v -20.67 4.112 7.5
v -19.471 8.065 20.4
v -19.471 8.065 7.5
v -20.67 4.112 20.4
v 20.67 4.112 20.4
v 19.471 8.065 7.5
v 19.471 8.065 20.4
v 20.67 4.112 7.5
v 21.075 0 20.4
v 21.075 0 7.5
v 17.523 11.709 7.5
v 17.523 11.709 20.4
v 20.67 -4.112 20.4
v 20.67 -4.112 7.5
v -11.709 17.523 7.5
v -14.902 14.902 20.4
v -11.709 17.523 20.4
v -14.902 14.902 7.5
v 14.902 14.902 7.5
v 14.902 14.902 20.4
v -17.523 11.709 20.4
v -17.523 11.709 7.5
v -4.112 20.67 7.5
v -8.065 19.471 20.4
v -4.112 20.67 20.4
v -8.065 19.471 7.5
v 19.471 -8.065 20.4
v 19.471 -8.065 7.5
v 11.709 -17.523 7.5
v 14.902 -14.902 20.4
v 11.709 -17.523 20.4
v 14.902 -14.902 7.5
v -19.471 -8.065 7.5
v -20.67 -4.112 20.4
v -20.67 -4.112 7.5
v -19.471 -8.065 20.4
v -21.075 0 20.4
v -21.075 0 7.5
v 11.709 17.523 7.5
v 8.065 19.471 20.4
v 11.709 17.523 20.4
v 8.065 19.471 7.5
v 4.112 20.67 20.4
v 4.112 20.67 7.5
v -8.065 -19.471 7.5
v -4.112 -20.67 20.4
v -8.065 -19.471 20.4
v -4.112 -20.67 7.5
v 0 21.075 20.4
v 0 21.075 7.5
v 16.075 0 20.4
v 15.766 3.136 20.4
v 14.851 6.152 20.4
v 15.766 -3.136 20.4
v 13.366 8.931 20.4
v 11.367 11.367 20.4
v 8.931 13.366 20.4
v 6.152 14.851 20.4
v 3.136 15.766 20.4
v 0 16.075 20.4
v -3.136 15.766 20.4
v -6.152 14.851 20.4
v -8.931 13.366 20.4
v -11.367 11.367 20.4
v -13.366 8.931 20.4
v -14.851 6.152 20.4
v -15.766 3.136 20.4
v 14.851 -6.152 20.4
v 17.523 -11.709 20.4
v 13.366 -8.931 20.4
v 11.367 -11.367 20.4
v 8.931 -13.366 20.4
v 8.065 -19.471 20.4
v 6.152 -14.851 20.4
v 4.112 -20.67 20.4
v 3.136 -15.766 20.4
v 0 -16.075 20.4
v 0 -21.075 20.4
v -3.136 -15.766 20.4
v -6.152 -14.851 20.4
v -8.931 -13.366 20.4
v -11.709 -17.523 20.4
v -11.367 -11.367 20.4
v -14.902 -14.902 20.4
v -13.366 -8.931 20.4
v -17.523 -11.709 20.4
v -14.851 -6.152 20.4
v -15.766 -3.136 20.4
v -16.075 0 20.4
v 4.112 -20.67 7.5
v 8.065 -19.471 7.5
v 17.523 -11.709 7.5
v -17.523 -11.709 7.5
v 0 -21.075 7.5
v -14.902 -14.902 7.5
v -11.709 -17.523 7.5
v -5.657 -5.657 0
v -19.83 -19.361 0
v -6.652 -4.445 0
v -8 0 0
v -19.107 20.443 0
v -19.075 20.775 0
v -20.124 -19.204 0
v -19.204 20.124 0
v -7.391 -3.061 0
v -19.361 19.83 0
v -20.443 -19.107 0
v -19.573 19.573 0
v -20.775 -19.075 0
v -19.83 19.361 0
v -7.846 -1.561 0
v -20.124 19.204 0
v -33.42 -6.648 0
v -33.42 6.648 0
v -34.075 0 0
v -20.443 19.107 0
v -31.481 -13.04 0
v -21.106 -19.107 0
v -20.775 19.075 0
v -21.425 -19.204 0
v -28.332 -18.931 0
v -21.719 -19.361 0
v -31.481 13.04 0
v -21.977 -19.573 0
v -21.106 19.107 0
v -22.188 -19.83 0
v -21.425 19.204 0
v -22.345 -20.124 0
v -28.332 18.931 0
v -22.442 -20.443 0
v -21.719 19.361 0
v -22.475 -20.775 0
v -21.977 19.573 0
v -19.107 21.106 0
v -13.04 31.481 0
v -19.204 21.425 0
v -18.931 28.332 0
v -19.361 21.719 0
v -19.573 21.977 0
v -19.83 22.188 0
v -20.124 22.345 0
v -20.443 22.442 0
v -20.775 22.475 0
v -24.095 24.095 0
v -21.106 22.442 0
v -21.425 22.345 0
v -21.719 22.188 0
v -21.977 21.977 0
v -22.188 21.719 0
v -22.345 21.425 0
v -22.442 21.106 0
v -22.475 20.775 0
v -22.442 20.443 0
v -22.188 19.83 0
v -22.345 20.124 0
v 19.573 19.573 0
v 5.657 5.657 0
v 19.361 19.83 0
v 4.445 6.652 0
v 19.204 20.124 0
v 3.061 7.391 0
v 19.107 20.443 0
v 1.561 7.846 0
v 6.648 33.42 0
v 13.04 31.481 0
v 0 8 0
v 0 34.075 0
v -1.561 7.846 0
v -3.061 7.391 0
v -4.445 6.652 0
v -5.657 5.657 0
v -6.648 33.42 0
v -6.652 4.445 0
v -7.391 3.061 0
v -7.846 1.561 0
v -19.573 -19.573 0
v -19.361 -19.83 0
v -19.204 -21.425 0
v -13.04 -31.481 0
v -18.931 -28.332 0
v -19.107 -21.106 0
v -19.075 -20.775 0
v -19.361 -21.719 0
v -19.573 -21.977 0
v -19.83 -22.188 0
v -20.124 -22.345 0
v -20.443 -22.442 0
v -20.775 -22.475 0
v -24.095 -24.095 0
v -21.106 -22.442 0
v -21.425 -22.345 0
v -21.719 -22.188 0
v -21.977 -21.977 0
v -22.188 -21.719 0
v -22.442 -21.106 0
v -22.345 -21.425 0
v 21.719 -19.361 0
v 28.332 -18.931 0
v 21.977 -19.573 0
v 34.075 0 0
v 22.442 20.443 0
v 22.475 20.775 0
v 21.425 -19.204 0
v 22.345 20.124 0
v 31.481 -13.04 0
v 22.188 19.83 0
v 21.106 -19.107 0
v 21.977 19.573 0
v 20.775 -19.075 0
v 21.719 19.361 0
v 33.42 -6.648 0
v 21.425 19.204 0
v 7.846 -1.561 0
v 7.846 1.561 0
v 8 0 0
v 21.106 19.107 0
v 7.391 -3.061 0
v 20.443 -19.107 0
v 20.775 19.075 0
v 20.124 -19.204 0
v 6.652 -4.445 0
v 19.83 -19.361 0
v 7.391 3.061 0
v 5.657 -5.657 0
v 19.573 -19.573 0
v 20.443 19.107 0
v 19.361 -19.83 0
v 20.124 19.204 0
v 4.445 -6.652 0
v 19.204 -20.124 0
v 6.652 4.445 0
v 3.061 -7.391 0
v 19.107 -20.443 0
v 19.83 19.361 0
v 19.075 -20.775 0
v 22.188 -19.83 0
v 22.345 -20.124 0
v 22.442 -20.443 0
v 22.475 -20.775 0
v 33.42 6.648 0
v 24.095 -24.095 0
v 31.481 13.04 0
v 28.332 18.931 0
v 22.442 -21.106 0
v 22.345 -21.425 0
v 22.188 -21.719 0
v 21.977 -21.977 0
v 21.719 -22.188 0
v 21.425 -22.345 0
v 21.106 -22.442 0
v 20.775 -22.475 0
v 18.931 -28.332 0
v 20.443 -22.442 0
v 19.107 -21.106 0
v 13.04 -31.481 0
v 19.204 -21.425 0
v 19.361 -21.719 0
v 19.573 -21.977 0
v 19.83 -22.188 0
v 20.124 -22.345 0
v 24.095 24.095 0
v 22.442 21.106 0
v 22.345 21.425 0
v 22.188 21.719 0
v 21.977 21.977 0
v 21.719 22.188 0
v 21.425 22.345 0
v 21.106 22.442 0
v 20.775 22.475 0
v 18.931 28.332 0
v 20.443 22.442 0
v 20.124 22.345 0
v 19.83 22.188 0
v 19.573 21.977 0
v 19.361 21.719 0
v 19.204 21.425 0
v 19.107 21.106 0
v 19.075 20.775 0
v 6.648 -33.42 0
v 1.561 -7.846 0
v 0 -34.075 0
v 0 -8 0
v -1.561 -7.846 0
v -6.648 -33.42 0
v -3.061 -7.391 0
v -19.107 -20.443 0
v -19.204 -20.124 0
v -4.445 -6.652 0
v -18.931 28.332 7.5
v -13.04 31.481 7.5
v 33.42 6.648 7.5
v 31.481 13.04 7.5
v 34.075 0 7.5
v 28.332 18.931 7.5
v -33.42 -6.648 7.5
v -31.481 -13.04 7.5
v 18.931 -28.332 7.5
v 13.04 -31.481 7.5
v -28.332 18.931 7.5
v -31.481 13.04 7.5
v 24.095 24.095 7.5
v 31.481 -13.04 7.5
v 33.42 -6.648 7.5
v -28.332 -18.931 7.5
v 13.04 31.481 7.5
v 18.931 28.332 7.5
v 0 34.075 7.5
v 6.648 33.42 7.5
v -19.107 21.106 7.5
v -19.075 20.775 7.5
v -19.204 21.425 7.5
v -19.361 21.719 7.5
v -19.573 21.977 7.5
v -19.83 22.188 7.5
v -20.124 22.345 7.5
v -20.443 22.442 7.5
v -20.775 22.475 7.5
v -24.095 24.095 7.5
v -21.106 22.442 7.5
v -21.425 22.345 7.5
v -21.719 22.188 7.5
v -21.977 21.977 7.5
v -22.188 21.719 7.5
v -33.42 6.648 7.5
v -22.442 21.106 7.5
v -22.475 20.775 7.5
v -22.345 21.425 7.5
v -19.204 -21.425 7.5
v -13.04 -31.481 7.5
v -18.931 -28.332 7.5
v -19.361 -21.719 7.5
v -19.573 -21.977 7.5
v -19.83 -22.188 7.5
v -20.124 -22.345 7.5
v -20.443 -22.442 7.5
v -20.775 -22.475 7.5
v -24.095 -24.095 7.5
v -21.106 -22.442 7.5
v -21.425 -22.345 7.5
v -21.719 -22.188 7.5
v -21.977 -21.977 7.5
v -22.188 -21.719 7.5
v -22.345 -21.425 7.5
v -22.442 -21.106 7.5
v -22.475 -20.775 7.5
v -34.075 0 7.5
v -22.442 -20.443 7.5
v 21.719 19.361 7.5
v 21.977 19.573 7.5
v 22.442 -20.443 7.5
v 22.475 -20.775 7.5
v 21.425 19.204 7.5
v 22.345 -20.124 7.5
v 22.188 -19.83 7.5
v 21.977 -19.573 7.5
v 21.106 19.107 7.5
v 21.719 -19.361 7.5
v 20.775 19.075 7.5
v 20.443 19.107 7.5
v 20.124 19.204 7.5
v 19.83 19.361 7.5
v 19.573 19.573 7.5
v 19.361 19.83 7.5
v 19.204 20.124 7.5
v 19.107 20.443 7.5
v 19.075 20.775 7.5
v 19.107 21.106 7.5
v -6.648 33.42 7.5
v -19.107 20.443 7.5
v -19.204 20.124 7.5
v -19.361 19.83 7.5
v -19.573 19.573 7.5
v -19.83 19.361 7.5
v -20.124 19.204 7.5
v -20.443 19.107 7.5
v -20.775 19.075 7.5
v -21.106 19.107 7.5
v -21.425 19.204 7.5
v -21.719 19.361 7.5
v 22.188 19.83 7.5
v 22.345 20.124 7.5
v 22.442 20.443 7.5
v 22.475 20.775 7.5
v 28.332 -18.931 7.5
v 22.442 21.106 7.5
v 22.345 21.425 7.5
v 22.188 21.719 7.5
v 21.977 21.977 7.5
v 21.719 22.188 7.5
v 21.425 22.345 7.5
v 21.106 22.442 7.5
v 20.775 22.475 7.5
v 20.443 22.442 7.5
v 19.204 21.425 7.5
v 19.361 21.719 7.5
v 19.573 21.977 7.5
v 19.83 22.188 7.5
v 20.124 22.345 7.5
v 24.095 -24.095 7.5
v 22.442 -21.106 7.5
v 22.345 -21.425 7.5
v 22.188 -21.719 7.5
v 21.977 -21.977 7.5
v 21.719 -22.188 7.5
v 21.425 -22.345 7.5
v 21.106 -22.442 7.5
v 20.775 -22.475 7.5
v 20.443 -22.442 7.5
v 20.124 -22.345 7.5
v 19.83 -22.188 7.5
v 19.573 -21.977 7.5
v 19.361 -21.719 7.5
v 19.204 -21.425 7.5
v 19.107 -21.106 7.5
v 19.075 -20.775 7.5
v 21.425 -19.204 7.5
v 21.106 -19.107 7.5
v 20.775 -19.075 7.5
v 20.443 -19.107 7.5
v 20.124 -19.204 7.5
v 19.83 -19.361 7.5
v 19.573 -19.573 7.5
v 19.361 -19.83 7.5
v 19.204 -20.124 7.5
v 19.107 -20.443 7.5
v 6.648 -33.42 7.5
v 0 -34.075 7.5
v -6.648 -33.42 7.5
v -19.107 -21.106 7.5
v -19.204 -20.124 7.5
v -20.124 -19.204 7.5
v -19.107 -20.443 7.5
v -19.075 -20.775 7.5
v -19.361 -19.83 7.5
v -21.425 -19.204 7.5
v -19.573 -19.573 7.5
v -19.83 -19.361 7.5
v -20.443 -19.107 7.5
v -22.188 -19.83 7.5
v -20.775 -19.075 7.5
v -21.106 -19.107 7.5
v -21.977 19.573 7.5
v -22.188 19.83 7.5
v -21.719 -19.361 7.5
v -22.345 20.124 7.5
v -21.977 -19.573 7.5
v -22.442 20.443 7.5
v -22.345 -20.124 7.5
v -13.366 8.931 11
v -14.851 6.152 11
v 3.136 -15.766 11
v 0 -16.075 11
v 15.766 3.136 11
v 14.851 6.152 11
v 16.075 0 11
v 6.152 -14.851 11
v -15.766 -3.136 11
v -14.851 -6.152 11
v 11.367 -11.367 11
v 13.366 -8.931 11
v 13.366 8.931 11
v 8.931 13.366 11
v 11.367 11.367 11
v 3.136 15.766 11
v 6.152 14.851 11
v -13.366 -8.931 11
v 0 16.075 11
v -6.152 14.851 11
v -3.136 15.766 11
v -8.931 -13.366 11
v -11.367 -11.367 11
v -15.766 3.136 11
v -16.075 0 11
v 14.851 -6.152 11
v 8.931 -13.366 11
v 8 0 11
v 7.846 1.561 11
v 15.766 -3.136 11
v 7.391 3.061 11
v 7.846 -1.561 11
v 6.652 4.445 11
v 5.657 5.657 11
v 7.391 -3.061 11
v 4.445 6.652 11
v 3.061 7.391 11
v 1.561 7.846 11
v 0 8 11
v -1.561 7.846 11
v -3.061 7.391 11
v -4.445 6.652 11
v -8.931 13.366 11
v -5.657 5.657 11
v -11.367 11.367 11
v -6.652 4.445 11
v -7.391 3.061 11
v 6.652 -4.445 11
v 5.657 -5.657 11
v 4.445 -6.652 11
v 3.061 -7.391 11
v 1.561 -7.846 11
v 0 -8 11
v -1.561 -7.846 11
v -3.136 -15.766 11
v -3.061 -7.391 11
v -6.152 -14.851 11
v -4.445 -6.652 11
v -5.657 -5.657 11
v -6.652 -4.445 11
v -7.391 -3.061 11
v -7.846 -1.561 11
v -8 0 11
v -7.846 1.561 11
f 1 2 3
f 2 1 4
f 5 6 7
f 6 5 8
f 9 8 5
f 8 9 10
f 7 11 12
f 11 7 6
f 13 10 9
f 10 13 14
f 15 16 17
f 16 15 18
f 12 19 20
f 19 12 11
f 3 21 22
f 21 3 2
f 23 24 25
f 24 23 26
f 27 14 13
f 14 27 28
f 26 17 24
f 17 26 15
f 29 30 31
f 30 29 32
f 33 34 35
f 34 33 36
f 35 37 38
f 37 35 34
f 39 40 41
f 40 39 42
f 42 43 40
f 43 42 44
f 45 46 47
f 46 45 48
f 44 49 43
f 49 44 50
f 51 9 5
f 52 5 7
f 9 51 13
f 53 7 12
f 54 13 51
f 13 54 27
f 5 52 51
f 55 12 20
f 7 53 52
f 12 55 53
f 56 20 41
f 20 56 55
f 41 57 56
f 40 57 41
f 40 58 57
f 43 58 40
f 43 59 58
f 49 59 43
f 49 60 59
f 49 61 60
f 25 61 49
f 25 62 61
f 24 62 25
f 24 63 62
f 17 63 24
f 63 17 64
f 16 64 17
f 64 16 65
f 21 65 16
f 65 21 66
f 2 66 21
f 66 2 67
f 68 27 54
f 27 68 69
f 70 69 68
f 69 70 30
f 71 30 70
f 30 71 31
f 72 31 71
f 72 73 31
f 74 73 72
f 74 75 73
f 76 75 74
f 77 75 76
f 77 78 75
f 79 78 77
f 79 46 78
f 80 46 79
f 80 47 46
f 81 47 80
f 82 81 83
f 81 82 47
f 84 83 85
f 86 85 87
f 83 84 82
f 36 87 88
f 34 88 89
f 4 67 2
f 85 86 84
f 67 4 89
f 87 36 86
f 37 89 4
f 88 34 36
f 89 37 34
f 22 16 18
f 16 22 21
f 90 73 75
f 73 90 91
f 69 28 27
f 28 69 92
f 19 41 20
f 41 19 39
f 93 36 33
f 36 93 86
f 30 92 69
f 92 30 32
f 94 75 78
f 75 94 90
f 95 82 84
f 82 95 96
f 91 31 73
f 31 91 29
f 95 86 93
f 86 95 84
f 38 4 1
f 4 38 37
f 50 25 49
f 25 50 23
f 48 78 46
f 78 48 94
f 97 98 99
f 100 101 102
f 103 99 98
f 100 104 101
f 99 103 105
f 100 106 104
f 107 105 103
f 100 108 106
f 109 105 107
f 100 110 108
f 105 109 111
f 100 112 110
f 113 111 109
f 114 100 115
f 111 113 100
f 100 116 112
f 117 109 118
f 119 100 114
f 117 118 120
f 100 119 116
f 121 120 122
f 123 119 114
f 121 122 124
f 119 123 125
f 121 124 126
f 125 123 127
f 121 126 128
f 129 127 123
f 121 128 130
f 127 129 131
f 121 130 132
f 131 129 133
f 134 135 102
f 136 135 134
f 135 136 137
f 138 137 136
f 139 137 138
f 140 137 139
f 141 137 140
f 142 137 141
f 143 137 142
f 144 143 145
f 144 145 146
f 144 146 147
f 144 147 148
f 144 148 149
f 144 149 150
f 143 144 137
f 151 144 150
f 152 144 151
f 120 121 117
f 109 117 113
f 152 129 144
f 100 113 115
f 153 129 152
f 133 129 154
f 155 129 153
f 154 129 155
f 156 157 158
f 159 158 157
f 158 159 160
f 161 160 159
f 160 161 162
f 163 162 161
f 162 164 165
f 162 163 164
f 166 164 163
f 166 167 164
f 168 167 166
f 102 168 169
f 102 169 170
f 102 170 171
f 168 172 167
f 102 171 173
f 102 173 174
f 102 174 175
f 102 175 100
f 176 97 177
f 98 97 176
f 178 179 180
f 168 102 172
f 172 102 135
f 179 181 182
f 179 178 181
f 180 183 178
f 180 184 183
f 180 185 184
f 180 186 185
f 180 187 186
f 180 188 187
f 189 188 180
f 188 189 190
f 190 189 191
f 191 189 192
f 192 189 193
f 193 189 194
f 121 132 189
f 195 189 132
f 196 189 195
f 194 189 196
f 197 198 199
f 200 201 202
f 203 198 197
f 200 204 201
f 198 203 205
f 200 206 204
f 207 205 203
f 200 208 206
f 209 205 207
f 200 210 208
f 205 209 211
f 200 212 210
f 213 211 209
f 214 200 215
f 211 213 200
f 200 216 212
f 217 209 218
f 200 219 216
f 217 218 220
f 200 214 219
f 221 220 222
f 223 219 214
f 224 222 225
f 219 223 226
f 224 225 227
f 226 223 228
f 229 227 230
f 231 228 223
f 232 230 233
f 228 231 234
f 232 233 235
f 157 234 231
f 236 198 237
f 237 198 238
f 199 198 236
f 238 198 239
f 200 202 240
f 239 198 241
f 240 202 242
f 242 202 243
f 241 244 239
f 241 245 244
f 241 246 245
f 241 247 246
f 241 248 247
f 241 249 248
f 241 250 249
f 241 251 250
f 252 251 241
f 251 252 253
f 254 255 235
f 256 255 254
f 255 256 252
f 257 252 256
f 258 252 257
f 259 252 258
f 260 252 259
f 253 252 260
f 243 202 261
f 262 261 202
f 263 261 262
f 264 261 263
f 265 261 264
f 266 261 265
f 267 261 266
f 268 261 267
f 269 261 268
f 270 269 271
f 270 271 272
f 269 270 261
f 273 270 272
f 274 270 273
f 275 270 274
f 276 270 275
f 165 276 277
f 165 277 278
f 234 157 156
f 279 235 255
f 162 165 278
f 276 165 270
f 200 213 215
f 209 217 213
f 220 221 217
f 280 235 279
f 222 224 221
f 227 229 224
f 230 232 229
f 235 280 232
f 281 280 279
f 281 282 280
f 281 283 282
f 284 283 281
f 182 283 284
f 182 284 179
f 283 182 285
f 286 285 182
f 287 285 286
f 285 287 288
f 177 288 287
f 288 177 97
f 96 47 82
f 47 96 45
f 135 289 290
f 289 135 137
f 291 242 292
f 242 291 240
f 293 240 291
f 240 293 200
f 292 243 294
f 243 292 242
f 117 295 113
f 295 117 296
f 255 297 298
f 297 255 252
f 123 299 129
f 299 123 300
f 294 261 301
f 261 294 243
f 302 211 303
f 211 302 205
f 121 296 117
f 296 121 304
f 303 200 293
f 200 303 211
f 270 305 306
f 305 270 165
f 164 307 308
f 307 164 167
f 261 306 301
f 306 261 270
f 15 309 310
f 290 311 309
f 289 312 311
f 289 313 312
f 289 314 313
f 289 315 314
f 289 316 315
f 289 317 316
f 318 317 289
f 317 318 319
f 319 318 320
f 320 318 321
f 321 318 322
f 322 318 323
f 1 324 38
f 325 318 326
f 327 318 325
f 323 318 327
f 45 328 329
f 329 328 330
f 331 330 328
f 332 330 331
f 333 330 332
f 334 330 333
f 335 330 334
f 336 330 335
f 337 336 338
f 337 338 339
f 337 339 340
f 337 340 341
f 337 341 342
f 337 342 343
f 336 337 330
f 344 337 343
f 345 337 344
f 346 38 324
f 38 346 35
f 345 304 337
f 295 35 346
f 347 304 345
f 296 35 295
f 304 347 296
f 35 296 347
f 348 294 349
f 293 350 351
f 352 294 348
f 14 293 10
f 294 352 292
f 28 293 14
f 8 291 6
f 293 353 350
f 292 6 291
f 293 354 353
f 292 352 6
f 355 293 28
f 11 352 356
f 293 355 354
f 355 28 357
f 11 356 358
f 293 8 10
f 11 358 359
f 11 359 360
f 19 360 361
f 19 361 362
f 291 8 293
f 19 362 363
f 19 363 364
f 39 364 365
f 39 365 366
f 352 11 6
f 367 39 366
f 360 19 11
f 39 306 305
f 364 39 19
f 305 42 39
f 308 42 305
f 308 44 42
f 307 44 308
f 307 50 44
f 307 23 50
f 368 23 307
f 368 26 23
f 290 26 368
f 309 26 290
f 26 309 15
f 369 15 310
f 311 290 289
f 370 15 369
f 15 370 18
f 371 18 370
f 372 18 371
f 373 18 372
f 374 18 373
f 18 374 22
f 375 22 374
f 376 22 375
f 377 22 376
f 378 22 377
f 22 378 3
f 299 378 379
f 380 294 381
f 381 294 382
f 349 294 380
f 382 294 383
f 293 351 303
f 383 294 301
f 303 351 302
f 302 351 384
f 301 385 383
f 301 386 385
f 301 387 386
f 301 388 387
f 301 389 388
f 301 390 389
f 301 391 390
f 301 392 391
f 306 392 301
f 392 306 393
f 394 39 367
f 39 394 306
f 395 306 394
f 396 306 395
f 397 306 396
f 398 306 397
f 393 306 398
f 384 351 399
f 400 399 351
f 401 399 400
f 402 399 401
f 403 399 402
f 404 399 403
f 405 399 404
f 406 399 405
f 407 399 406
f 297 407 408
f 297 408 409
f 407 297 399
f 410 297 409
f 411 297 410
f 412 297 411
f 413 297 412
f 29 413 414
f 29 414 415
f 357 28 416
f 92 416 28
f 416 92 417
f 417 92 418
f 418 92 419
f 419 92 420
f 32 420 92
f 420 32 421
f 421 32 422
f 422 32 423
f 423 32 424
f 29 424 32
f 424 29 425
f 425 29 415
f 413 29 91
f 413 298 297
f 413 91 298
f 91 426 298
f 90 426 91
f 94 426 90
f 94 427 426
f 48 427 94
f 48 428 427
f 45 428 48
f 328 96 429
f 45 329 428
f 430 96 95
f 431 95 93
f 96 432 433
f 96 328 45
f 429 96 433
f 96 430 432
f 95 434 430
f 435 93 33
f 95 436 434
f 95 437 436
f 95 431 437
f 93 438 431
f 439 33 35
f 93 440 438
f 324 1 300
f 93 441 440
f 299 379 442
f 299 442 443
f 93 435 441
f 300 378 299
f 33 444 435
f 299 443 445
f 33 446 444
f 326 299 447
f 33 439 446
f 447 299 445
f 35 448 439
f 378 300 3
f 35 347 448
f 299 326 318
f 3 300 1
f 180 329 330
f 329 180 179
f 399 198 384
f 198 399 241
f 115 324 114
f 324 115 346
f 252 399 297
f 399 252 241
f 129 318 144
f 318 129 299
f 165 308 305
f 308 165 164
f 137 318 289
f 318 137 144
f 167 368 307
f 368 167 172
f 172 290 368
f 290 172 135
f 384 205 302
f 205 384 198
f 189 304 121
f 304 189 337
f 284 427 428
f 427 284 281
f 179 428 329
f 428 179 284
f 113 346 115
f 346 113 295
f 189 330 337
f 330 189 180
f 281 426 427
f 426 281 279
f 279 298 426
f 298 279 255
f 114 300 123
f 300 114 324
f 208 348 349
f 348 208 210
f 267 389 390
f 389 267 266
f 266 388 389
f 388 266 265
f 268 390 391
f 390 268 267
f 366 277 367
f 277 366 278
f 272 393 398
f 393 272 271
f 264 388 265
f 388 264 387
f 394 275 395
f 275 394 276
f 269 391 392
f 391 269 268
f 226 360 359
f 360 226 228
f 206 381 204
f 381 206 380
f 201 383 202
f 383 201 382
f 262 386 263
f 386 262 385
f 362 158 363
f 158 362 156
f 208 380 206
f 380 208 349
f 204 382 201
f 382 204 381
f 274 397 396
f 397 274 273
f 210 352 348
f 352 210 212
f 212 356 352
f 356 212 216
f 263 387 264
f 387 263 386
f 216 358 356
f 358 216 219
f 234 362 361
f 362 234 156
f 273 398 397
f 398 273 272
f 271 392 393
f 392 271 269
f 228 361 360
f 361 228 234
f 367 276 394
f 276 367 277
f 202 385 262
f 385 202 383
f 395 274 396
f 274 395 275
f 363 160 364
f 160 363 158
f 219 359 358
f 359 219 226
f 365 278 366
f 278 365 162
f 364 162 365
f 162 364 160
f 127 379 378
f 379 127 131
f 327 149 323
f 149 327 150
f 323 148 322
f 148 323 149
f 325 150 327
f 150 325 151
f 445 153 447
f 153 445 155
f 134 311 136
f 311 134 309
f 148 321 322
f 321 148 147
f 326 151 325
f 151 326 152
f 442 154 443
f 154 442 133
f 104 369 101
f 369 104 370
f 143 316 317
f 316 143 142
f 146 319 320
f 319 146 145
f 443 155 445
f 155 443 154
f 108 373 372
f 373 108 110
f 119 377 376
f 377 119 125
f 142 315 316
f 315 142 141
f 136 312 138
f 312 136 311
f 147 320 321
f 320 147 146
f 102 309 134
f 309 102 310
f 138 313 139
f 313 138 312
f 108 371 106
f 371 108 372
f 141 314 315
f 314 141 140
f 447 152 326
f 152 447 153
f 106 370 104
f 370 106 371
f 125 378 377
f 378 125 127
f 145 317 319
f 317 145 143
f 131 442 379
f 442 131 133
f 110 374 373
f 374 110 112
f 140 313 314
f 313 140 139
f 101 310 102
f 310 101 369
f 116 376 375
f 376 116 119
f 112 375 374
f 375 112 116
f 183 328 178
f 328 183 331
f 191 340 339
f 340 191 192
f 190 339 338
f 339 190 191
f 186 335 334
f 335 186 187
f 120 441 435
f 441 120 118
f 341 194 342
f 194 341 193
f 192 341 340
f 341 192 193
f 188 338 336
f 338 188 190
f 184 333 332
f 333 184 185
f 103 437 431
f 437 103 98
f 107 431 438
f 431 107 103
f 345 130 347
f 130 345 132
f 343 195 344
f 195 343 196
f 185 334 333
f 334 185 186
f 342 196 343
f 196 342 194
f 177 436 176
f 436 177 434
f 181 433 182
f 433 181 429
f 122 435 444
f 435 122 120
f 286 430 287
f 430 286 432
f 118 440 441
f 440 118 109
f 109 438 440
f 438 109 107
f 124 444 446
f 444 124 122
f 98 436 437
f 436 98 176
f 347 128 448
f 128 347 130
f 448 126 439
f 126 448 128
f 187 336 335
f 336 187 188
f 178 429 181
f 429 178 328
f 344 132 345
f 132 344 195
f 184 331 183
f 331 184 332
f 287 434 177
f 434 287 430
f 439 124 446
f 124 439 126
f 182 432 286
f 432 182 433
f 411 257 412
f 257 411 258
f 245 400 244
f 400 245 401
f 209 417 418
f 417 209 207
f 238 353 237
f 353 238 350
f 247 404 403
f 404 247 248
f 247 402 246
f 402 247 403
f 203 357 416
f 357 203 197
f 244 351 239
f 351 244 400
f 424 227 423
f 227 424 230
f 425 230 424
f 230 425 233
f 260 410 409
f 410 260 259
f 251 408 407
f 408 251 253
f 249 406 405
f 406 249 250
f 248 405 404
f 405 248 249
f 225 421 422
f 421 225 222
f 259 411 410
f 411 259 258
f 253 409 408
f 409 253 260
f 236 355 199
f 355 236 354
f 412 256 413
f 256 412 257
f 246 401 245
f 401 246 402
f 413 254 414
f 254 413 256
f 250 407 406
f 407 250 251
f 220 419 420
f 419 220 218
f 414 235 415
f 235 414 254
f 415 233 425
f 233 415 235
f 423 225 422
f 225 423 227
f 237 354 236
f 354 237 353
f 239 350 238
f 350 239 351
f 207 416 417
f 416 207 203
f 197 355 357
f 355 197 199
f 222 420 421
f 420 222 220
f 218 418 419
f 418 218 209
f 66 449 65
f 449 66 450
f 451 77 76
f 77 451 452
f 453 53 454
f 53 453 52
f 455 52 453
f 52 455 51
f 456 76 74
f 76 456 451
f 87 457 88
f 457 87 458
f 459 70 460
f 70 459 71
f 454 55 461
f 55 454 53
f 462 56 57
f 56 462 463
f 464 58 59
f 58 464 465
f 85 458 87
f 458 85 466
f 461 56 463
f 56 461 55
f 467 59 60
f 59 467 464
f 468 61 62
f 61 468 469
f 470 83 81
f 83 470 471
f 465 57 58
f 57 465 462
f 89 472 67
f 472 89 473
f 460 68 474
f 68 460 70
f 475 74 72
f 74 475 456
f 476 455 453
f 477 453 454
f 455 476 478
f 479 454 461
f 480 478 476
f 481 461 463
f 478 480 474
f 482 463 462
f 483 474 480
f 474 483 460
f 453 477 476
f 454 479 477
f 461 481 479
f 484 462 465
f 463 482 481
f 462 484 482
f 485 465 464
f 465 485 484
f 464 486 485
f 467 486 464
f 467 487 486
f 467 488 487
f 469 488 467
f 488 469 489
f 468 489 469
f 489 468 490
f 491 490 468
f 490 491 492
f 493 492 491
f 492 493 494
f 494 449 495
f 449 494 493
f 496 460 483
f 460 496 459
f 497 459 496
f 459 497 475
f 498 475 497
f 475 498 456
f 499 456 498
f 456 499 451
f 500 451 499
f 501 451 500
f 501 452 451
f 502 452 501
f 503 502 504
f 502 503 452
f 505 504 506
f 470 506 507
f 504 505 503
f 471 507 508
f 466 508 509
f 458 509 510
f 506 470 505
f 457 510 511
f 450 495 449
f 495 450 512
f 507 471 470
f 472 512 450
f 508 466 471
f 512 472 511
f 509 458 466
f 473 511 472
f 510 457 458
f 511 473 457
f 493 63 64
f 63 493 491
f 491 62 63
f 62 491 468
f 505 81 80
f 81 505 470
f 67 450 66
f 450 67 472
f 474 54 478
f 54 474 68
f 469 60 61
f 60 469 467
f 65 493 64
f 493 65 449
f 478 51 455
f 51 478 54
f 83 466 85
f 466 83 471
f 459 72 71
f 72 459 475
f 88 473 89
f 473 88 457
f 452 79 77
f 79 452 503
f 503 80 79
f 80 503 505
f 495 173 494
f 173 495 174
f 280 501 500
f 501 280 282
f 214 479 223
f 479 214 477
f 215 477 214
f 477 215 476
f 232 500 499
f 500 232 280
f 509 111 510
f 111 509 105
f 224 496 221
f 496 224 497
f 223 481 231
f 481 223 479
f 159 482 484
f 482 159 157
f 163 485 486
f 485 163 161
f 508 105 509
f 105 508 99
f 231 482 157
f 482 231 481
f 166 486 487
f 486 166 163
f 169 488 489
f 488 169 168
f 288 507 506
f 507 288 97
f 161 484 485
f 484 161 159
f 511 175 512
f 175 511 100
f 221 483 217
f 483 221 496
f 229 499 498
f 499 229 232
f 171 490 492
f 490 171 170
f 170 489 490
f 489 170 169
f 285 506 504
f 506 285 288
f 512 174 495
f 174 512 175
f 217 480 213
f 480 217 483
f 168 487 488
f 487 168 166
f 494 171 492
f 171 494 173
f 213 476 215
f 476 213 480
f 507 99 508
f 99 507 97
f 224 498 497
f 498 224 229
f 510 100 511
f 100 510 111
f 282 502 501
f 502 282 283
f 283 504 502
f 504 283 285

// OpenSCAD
$fn = 32;

// ----------------------------------------------------------------------
// Bearing housing: seat for 6002 (32 x 9 mm), 42.15 mm body
// ----------------------------------------------------------------------

// --- parameters (mm) ---
housing_d = 42.15;        // housing outside diameter
housing_h = 20.4;         // overall housing height
wall_t = 5;               // wall thickness
seat_d = 32.15;           // 6002 seat, 0.15 mm clearance
seat_h = 9.4;             // pocket depth
shoulder = 5;             // shoulder under the bearing
pass_d = 16;              // shaft passage
flange_d = 68.15;         // mounting flange diameter
flange_t = 6;             // flange thickness
bolt_d = 3.4;             // flange bolt clearance
bolt_r = 29.38;           // flange bolt circle radius

module body() {
  cylinder(h = housing_h, d = housing_d);
}

module flange() {
  /* flange sunk 1.5 mm into the body */
  cylinder(h = flange_t + 1.5, d = flange_d);
}

difference() {
  union() {
    body();
    flange();
  }
  translate([0, 0, housing_h - seat_h]) cylinder(h = seat_h + 1, d = seat_d);
  translate([0, 0, -1]) cylinder(h = housing_h - seat_h + 1, d = pass_d);
  for (i = [0 : 3]) rotate([0, 0, 45 + i * 90]) translate([bolt_r, 0, -1])
    cylinder(h = flange_t + 3, d = bolt_d);
}
